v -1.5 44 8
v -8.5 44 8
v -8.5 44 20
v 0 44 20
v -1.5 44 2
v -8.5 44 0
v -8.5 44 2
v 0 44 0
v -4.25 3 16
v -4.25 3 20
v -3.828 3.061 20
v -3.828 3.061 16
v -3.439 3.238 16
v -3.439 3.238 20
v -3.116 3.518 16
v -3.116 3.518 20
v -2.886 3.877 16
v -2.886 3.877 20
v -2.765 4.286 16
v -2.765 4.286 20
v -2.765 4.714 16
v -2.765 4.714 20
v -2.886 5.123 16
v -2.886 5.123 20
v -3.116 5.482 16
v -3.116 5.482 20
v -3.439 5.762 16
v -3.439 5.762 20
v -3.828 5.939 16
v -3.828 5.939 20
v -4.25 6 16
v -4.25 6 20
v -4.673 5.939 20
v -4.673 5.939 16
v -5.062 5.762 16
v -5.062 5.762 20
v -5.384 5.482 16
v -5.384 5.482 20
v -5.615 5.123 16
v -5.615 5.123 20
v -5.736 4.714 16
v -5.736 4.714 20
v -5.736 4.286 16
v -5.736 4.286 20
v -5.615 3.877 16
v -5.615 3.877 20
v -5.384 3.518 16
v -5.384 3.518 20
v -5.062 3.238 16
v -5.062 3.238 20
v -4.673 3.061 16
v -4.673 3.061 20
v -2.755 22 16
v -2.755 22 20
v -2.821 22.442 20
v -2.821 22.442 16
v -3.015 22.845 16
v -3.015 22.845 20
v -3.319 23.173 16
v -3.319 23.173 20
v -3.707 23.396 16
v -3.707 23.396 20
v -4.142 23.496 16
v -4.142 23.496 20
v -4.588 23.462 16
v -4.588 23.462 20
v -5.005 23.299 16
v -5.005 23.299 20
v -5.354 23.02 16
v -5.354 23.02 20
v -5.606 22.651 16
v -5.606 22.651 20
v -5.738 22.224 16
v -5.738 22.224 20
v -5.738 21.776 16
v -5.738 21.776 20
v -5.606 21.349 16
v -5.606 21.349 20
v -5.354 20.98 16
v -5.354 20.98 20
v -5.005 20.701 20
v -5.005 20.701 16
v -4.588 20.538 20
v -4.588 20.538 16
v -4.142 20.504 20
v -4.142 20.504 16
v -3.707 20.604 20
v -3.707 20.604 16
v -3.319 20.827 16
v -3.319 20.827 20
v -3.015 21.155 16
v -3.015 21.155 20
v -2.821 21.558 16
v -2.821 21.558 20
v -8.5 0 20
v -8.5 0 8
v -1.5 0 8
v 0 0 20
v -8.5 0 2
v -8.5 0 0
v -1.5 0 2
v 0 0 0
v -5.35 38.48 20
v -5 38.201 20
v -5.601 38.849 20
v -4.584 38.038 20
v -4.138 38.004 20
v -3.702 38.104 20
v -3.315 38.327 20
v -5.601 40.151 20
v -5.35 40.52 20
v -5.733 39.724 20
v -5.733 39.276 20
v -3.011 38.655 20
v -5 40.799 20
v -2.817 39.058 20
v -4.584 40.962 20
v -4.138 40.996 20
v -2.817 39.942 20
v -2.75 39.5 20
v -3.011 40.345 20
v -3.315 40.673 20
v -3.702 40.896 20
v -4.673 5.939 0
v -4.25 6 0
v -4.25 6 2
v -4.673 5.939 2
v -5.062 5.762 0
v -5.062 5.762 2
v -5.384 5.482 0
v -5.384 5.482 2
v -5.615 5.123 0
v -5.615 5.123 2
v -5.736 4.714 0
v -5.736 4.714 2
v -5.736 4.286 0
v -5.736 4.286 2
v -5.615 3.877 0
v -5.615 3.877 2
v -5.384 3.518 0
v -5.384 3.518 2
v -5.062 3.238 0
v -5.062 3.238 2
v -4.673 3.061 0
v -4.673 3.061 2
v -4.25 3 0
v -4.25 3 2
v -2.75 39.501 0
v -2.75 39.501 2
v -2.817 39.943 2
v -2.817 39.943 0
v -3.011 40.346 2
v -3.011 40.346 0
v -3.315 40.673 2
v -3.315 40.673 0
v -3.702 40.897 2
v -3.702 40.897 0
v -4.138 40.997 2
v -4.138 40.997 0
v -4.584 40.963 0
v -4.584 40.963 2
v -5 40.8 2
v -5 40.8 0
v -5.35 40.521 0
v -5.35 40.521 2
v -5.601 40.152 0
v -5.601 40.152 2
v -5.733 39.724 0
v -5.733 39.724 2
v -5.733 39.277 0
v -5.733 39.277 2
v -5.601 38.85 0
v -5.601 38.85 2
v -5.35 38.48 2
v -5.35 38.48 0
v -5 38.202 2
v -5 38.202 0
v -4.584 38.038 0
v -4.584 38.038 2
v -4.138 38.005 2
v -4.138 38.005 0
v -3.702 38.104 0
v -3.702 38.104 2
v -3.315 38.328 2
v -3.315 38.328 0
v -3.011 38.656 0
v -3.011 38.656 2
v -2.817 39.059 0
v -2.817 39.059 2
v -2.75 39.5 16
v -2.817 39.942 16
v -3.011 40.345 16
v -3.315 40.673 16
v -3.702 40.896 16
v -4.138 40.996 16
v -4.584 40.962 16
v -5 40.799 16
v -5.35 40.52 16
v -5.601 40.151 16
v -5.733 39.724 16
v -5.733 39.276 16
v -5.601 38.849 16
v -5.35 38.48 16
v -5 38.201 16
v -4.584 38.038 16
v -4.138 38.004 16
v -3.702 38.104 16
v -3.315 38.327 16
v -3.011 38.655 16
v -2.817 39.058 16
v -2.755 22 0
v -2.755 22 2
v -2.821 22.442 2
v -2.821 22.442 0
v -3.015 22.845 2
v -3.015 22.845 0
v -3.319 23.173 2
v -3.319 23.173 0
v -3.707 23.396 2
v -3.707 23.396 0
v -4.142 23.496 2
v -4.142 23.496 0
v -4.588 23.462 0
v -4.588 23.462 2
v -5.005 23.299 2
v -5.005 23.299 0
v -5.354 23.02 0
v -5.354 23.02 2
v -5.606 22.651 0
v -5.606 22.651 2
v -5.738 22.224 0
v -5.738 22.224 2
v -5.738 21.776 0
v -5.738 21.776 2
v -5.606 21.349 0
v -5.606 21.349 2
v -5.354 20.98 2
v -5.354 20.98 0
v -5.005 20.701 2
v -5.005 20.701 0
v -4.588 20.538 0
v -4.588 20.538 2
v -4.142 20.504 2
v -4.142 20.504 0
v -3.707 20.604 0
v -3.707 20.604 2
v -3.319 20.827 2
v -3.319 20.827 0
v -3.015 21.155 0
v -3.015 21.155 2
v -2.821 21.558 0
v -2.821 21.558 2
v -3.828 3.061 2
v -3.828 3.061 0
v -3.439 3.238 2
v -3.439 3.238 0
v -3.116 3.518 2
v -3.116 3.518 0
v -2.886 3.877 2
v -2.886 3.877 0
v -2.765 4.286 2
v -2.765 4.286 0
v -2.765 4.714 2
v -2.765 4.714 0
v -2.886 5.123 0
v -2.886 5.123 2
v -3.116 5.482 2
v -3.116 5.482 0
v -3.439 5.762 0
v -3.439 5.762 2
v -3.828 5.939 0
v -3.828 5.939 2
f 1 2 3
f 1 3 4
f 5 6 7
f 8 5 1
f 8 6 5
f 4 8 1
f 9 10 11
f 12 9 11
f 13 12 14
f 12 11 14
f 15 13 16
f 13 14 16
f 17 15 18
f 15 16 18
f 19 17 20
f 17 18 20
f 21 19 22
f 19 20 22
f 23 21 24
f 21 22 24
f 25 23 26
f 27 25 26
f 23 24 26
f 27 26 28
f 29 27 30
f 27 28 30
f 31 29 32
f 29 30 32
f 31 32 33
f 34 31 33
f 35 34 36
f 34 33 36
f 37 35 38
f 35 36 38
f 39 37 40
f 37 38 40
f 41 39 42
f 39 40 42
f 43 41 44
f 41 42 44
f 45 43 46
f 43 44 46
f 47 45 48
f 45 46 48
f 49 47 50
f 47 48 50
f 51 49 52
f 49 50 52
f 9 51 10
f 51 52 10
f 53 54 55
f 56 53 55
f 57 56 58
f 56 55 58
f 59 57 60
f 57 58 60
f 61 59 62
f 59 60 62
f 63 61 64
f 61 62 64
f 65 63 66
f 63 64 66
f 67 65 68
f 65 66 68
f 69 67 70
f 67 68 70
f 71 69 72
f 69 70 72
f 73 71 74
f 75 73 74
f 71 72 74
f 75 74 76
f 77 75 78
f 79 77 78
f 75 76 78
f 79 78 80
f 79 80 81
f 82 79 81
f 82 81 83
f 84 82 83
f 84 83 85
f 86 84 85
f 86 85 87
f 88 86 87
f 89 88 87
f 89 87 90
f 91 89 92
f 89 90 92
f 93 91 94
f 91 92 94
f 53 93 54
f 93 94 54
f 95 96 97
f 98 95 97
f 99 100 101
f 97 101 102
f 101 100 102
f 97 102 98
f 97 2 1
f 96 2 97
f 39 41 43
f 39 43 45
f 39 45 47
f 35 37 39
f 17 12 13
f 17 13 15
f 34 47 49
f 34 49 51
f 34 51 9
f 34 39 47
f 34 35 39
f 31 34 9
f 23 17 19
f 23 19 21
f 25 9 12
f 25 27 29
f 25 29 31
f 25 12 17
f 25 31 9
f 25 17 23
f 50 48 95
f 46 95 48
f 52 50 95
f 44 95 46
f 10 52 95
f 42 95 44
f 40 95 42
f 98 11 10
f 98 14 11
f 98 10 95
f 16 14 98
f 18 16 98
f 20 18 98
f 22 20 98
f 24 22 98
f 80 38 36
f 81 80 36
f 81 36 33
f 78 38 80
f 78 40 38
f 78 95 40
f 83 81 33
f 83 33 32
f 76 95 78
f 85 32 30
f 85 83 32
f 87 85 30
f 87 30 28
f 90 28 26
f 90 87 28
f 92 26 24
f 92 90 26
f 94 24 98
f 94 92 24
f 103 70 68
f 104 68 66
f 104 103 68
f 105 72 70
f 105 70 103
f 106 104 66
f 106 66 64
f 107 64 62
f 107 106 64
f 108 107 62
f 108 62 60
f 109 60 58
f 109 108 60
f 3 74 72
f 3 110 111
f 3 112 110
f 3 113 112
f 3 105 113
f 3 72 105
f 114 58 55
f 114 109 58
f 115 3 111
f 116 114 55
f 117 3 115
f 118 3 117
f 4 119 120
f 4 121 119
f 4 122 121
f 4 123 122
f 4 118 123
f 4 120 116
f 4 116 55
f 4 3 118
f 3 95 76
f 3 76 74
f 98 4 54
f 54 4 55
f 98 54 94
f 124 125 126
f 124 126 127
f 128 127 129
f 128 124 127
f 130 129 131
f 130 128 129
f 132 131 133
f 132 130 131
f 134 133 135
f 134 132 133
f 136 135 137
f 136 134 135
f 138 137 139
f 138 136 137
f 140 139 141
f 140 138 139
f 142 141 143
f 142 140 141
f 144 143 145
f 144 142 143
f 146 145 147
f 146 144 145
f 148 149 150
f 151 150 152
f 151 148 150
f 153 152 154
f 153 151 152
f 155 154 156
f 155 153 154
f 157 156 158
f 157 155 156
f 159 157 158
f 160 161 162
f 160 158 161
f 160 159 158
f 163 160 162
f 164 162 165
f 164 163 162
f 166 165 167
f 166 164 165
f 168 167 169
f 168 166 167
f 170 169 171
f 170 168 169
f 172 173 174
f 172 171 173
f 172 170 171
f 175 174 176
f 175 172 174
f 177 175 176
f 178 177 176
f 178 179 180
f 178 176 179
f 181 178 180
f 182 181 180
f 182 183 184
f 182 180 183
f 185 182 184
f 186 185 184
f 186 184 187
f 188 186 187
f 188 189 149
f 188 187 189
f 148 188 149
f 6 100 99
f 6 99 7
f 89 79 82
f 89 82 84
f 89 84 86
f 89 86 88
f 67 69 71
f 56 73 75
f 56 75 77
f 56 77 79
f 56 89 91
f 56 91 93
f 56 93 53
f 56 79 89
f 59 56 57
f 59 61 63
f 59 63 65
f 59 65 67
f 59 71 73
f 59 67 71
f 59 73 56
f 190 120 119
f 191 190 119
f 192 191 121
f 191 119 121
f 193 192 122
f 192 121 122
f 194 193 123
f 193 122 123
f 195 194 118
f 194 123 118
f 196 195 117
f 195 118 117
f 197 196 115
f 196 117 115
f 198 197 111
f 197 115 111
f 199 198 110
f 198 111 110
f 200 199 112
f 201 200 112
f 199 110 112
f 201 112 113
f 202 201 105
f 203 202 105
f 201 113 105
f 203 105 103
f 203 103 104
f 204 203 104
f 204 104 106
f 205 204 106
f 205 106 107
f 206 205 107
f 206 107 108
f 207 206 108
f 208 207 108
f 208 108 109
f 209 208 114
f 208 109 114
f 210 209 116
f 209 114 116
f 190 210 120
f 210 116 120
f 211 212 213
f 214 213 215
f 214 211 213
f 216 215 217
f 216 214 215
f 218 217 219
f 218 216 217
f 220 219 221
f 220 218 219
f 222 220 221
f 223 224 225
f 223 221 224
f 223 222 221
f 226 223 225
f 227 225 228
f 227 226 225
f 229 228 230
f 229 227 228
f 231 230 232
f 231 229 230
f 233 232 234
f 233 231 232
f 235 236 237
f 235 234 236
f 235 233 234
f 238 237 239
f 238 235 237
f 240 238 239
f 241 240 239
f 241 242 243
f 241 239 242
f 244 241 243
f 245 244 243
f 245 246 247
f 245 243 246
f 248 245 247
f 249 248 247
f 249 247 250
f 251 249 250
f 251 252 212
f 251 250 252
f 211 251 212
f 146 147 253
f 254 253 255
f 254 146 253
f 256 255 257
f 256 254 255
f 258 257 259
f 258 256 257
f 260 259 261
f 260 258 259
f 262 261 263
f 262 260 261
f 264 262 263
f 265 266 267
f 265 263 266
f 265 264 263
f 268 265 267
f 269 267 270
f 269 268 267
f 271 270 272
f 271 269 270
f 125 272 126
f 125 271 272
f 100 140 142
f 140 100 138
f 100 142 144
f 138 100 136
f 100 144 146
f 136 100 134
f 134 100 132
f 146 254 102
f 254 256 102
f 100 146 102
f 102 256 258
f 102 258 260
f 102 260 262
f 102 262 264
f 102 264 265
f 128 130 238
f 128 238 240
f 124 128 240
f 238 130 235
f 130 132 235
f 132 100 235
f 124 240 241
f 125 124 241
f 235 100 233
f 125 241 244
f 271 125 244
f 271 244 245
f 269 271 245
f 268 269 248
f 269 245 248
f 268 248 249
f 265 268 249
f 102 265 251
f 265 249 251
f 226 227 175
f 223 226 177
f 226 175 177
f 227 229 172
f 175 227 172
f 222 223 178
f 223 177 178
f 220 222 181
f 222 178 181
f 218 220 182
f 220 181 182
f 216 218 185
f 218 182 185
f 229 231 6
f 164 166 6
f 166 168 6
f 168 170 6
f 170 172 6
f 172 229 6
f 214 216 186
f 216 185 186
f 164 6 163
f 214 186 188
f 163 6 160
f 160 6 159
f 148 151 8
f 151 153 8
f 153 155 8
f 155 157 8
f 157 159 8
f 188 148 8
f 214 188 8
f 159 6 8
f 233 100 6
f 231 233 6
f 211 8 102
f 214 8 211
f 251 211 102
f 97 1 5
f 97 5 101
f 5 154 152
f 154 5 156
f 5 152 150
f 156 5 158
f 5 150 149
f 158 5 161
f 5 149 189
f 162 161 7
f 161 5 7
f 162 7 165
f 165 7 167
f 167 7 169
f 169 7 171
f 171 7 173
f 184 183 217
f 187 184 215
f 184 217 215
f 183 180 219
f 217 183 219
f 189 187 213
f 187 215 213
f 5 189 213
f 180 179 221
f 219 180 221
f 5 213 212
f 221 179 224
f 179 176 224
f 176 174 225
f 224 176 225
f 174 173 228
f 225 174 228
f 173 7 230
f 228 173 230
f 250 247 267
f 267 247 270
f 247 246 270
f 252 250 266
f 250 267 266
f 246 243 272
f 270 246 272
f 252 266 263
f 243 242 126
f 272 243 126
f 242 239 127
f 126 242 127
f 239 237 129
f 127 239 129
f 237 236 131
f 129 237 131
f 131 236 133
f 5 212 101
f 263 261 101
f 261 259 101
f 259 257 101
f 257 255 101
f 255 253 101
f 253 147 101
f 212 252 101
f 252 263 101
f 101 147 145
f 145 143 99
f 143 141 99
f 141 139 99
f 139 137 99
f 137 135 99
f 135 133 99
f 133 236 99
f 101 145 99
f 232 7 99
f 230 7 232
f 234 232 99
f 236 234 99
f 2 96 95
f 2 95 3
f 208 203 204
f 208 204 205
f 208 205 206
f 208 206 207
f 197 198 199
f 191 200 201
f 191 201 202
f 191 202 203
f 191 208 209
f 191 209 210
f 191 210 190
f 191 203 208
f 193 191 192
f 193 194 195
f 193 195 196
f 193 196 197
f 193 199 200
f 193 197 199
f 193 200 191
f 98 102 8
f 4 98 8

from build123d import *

# Parameters (mm, degrees)
SKETCH029_W   = 8.5
SKETCH029_H   = 44
PAD002_DEPTH  = 20
SKETCH023_R   = 1.5
HOLE004_DEPTH = 4
SKETCH032_R   = 1.5
HOLE006_DEPTH = 4
SKETCH034_W   = 44
SKETCH034_H   = 6
POCKET_DEPTH  = 7


with BuildPart() as part:
    # Sketch029 → Pad002 (new body)
    with BuildSketch(Plane.XY):
        with Locations((-4.25, 22)):
            Rectangle(SKETCH029_W, SKETCH029_H)
    extrude(amount=PAD002_DEPTH)

    # Sketch023 → Hole004 (cut)
    with BuildSketch(Plane.XY):
        with Locations((-4.250802, 4.5)):
            Circle(SKETCH023_R)
        with Locations((-4.25, 39.500714)):
            Circle(SKETCH023_R)
        with Locations((-4.254534, 22)):
            Circle(SKETCH023_R)
        with Locations((-4.25, 4.5)):
            Circle(SKETCH023_R)
    extrude(amount=HOLE004_DEPTH, mode=Mode.SUBTRACT)

    # Sketch032 (on Face5 of Hole004) → Hole006 (cut)
    with BuildSketch(Plane.XY.offset(20)):
        with Locations((-4.250802, 4.5)):
            Circle(SKETCH032_R)
        with Locations((-4.25, 39.499999)):
            Circle(SKETCH032_R)
        with Locations((-4.254534, 22)):
            Circle(SKETCH032_R)
        with Locations((-4.25, 4.5)):
            Circle(SKETCH032_R)
    extrude(amount=-HOLE006_DEPTH, mode=Mode.SUBTRACT)

    # Sketch034 (on Face3 of Hole006) → Pocket (cut)
    with BuildSketch(Plane(origin=(-8.5, 0, 0), x_dir=(0, -1, 0), z_dir=(-1, 0, 0))):
        with Locations((-22, 5)):
            Rectangle(SKETCH034_W, SKETCH034_H)
    extrude(amount=-POCKET_DEPTH, mode=Mode.SUBTRACT)


solid = part.part
